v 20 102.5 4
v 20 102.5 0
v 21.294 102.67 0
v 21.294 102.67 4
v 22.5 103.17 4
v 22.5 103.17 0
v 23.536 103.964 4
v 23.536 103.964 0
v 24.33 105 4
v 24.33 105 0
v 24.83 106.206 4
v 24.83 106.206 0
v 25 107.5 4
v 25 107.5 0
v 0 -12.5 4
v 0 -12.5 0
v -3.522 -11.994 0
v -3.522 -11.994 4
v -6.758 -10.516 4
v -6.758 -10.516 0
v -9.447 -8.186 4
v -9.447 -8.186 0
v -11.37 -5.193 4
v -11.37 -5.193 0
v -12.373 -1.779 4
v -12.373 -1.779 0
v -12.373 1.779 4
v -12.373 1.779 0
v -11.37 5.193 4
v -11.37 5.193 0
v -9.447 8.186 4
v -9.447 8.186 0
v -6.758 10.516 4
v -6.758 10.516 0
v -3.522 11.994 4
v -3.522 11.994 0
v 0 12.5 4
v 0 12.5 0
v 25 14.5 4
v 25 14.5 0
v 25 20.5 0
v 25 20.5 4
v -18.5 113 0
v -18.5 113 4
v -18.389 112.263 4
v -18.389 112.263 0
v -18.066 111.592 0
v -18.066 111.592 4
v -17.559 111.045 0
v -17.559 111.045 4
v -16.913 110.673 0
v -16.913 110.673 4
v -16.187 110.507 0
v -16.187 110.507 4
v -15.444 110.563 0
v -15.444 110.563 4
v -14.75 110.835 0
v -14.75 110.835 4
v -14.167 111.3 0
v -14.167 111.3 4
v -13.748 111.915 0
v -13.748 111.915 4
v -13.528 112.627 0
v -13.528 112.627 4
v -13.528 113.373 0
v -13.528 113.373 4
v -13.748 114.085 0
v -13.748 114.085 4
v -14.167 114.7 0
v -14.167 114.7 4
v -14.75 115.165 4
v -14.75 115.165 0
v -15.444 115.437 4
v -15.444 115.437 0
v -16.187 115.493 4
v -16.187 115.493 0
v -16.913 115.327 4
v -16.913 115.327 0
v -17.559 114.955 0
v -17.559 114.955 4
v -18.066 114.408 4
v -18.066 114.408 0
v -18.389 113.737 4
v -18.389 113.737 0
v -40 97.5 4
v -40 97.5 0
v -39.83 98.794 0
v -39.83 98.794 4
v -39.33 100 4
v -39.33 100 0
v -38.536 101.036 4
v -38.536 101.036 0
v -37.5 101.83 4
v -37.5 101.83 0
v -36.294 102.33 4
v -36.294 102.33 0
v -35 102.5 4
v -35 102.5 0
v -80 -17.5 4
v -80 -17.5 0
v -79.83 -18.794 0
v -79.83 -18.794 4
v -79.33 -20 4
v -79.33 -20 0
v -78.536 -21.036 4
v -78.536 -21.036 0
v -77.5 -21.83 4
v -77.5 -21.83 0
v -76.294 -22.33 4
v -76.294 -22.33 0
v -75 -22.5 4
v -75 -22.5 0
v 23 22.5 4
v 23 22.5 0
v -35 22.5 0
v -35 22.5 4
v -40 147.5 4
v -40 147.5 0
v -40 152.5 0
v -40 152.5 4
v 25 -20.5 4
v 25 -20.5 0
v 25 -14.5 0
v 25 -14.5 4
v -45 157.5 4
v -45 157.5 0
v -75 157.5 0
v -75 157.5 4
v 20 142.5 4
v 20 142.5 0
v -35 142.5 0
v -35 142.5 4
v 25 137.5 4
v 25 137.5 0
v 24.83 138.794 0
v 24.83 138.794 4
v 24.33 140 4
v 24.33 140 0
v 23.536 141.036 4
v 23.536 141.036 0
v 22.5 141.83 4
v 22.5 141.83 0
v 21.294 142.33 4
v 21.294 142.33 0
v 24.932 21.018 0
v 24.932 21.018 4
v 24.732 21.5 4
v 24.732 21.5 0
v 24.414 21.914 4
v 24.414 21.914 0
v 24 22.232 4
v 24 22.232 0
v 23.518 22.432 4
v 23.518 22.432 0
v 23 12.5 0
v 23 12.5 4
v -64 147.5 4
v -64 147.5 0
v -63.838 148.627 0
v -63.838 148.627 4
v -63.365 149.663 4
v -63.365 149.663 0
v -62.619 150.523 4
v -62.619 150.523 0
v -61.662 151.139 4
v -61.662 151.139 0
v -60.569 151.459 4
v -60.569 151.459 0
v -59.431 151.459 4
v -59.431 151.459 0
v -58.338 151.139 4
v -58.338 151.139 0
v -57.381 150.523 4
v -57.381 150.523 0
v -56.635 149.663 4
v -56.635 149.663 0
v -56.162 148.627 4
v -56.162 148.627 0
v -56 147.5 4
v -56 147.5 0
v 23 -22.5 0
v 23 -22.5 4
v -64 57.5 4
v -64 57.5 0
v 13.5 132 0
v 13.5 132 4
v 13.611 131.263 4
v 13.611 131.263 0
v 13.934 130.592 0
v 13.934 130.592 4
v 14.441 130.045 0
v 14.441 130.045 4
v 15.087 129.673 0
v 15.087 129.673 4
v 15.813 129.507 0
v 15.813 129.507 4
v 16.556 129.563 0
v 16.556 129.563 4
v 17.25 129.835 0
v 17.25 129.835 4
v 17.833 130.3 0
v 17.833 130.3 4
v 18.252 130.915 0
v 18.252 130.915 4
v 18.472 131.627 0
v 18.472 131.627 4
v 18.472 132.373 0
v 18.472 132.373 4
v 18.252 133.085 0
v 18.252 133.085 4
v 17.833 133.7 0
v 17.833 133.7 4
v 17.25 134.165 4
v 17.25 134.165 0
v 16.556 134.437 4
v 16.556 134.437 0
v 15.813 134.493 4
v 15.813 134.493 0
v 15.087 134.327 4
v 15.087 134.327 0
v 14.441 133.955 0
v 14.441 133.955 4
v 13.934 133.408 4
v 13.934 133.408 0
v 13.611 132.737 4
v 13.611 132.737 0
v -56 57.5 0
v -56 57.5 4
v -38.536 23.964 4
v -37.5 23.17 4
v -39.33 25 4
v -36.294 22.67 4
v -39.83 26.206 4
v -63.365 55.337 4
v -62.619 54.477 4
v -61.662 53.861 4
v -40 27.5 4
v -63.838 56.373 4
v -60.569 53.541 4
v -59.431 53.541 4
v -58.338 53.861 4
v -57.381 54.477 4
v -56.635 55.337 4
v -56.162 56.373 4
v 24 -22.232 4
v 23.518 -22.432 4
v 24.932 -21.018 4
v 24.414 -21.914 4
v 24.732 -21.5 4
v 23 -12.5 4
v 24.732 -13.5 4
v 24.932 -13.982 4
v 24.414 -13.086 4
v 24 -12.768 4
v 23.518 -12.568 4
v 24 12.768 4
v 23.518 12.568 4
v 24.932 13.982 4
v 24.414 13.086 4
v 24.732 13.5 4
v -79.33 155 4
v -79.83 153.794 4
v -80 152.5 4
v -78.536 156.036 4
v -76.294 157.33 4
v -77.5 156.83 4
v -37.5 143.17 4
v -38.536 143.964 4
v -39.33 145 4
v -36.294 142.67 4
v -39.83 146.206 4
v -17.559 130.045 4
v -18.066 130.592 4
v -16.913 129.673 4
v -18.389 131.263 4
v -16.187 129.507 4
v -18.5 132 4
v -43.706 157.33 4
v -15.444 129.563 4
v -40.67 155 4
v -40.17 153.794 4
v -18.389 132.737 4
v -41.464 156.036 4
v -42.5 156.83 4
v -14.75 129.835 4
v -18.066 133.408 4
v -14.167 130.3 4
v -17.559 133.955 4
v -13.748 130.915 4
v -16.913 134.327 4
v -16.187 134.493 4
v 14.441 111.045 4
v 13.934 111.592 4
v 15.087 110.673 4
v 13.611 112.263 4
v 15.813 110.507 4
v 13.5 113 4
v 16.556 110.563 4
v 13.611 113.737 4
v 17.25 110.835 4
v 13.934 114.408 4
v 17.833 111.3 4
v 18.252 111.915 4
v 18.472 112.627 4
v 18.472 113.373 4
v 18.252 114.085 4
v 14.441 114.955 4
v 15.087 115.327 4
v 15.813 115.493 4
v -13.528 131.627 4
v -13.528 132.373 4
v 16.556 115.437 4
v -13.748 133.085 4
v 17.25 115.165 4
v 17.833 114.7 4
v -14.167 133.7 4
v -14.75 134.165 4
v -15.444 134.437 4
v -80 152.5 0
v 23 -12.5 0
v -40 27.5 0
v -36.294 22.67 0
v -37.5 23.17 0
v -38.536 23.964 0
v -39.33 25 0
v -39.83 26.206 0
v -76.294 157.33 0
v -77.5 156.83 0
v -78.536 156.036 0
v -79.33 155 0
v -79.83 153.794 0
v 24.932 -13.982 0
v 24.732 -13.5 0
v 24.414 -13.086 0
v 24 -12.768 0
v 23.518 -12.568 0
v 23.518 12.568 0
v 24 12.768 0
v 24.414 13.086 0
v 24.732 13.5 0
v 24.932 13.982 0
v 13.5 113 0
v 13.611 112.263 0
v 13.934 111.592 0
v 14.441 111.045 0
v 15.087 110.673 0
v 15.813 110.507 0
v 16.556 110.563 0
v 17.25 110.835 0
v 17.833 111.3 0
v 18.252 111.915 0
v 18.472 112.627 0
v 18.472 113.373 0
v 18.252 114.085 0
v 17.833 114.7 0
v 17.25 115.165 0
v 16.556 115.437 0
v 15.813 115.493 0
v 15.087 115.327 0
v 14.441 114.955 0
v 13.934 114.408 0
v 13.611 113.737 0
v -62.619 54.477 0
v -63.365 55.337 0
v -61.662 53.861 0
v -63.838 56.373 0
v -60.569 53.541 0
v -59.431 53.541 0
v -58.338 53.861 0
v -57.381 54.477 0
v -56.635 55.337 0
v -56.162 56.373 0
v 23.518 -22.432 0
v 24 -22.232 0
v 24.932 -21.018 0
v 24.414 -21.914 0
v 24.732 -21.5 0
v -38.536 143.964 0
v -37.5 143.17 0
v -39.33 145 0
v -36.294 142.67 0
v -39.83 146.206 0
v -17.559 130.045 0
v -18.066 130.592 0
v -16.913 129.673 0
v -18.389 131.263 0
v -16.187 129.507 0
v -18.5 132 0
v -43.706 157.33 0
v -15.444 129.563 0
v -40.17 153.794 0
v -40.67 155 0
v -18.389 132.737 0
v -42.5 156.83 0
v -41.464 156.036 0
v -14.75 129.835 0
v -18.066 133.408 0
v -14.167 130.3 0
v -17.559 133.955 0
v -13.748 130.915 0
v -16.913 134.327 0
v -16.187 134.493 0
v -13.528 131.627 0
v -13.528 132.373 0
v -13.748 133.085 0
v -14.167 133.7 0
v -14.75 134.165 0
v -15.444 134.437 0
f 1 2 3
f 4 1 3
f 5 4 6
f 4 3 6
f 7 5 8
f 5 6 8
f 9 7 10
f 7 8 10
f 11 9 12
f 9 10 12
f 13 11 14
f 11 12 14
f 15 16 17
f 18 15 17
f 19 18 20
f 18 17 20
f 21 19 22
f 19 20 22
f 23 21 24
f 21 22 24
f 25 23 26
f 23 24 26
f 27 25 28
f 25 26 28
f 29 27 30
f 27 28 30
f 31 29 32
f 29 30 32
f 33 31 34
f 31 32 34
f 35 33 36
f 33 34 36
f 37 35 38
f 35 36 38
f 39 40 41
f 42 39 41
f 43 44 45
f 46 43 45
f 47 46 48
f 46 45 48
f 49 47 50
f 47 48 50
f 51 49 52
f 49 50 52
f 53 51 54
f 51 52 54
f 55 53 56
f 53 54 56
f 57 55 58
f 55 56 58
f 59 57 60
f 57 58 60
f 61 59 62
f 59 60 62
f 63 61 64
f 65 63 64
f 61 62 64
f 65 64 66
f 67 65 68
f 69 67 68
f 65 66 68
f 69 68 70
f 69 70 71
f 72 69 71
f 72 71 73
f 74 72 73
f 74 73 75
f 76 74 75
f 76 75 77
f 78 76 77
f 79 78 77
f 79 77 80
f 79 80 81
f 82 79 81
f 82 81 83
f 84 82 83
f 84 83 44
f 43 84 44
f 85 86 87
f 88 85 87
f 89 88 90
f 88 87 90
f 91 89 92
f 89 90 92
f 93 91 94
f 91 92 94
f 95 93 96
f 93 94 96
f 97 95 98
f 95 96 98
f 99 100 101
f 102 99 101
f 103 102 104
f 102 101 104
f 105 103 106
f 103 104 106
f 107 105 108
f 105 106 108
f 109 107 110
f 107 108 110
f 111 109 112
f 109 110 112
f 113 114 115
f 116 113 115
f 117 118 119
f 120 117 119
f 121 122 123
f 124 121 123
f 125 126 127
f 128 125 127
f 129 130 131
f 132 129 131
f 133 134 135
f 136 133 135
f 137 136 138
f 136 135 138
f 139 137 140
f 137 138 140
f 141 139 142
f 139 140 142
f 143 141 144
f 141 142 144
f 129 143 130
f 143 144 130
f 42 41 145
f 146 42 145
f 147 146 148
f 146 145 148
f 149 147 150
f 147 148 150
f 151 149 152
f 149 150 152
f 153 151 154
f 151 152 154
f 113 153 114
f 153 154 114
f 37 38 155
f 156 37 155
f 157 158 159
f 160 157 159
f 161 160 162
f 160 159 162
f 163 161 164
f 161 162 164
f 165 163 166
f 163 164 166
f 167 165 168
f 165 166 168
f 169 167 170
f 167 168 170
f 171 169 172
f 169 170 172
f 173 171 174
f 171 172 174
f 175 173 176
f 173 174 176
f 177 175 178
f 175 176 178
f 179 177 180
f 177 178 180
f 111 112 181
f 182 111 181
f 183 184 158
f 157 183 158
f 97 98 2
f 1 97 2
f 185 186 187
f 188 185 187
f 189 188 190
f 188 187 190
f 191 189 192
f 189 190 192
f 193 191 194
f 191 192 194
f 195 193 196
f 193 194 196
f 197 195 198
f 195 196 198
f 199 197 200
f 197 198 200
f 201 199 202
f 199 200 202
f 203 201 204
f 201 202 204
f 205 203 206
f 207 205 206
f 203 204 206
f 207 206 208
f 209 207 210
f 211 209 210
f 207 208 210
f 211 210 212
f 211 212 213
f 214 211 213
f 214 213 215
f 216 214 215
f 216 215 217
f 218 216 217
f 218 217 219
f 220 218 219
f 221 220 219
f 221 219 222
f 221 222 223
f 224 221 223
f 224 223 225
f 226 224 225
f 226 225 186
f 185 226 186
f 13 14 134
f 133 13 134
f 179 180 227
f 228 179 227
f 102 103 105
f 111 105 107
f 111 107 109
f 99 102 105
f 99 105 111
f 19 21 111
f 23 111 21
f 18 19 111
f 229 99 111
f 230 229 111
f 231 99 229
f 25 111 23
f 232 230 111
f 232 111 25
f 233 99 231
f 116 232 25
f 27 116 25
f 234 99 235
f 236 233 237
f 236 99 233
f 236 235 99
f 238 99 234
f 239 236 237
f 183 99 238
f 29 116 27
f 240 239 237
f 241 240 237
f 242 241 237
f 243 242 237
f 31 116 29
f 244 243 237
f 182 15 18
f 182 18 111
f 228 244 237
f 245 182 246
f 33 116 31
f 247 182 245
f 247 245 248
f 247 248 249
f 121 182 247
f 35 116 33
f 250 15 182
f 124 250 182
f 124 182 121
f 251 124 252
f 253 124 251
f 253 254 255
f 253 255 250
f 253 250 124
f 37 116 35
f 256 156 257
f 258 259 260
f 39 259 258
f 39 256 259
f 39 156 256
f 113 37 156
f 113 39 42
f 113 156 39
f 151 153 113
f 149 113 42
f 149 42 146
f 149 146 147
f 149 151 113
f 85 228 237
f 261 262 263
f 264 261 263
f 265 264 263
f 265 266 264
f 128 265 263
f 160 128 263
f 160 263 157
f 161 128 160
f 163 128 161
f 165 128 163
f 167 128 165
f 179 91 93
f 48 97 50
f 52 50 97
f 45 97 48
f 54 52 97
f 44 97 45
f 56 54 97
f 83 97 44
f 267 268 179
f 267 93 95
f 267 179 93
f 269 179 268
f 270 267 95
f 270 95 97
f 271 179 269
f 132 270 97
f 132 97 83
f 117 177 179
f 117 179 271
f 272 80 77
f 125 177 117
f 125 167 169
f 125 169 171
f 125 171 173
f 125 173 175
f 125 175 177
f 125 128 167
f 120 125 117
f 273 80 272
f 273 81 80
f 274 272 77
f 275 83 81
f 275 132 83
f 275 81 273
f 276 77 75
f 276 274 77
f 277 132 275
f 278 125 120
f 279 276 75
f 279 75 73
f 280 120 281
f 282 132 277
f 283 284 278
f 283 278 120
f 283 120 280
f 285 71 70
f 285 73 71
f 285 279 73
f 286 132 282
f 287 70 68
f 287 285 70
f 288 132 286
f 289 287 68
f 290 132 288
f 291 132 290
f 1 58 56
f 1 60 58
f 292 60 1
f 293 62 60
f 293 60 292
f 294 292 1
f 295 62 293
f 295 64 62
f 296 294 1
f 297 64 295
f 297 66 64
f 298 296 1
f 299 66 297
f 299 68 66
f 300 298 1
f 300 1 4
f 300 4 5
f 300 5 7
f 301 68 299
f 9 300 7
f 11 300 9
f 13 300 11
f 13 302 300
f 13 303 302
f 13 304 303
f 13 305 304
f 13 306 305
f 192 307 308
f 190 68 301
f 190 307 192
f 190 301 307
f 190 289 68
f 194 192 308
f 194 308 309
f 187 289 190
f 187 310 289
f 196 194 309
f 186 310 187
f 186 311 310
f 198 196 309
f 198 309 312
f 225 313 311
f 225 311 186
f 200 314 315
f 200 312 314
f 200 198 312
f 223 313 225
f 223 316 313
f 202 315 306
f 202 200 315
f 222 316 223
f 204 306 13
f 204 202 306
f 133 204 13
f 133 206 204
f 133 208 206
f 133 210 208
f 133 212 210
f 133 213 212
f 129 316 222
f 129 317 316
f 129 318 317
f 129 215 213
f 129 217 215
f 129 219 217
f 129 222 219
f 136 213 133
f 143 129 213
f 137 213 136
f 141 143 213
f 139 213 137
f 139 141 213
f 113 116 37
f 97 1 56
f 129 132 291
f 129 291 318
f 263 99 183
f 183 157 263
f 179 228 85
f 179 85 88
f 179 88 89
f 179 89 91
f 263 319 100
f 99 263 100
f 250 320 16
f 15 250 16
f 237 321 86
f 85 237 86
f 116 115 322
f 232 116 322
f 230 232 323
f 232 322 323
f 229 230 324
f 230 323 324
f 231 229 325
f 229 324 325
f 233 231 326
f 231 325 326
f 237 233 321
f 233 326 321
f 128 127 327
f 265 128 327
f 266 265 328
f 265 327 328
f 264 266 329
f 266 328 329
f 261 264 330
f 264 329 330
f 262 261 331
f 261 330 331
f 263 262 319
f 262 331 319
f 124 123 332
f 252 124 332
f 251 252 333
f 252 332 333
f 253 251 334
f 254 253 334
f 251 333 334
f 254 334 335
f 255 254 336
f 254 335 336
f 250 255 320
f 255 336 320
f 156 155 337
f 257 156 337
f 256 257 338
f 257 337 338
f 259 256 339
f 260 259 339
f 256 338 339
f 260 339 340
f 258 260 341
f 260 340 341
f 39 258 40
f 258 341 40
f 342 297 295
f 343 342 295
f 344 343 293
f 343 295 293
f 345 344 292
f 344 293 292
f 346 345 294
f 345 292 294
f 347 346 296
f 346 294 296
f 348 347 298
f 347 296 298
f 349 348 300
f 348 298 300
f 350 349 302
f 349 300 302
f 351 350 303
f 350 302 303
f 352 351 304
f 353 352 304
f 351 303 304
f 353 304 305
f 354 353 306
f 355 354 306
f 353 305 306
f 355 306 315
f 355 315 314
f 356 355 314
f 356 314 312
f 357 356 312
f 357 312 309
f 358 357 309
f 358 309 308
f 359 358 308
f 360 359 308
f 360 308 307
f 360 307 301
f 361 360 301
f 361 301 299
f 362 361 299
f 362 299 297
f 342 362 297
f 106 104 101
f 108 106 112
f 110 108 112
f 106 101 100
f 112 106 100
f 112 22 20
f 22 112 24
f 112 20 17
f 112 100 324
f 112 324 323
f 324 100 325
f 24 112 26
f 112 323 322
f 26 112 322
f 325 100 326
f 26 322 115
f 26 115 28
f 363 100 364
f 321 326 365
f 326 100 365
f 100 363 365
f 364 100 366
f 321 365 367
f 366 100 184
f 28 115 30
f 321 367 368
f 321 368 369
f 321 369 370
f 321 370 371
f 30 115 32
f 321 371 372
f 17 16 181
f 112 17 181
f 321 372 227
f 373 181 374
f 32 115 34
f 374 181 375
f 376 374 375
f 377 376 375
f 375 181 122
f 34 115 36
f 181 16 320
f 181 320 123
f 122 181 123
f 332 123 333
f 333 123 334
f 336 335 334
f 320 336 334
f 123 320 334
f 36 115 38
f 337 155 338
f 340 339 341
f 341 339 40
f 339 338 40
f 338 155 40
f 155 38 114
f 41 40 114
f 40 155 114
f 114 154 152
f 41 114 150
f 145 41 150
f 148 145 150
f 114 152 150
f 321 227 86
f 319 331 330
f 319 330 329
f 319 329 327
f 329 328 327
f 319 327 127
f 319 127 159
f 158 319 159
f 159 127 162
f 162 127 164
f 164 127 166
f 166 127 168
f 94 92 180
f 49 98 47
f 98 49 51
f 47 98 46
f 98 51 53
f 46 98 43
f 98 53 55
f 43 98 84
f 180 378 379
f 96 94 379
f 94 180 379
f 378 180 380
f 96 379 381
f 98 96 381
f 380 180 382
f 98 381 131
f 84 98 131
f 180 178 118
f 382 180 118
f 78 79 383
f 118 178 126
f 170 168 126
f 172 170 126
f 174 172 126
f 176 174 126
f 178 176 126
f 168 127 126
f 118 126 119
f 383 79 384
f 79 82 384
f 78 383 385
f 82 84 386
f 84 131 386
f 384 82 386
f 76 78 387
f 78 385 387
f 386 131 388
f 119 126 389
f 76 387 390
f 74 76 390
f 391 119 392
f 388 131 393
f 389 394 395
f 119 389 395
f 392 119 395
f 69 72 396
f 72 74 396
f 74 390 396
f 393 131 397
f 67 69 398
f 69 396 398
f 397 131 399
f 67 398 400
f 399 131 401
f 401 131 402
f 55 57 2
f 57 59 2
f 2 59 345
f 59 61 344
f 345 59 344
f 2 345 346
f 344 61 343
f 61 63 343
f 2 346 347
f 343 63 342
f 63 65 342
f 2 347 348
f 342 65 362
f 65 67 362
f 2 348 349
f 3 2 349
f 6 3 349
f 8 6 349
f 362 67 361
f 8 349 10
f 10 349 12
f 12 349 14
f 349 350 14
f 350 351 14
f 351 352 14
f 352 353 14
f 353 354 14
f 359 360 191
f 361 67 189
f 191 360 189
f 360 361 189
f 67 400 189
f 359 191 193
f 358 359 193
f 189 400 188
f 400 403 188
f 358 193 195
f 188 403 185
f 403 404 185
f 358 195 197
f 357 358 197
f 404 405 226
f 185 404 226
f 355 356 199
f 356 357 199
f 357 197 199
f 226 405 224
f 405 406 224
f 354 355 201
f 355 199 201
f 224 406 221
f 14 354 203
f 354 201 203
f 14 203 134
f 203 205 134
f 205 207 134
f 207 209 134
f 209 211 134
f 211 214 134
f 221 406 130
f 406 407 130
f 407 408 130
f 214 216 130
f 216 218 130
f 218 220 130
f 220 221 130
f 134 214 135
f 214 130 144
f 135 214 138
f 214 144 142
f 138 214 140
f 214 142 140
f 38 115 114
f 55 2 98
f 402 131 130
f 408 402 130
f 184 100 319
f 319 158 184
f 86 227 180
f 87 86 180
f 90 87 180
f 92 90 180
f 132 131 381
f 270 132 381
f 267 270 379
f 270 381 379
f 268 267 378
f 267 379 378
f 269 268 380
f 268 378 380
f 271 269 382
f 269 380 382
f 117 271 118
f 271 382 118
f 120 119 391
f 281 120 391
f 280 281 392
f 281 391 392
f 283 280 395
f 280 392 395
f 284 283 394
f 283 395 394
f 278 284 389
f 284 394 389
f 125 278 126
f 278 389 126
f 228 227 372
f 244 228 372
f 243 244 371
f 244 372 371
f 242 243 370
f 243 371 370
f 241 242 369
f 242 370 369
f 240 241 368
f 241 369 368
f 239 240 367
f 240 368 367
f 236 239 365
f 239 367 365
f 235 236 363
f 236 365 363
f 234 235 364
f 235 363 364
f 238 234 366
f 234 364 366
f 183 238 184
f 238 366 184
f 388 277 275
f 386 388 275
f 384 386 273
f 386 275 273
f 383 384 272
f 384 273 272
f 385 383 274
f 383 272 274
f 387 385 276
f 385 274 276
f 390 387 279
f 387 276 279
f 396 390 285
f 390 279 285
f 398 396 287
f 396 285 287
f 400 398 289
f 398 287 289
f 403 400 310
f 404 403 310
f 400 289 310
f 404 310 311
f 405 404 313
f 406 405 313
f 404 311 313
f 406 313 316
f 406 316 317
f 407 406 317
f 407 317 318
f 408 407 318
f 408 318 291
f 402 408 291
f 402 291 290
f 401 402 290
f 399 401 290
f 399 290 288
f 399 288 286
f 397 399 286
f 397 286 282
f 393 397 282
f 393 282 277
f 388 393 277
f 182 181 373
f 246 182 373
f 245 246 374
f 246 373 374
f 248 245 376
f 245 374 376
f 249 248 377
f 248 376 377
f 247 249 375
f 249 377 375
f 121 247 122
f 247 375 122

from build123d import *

# Parameters (mm, degrees)
F1_DEPTH = 4
F2_D     = 5


with BuildPart() as f1:
    # F0 (on Top) → F1 (new body)
    with BuildSketch(Plane.XY):
        with BuildLine():
            ThreePointArc((0, -12.5), (-12.5, 0), (0, 12.5))
            Line((0, 12.5), (23, 12.5))
            ThreePointArc((23, 12.5), (24.4142135624, 13.0857864376), (25, 14.5))
            Line((25, 14.5), (25, 20.5))
            ThreePointArc((25, 20.5), (24.4142135624, 21.9142135624), (23, 22.5))
            Line((23, 22.5), (-35, 22.5))
            ThreePointArc((-35, 22.5), (-38.5355339059, 23.9644660941), (-40, 27.5))
            Line((-40, 27.5), (-40, 97.5))
            ThreePointArc((-40, 97.5), (-38.5355339059, 101.0355339059), (-35, 102.5))
            Line((-35, 102.5), (20, 102.5))
            ThreePointArc((20, 102.5), (23.5355339059, 103.9644660941), (25, 107.5))
            Line((25, 107.5), (25, 137.5))
            ThreePointArc((25, 137.5), (23.5355339059, 141.0355339059), (20, 142.5))
            Line((20, 142.5), (-35, 142.5))
            ThreePointArc((-35, 142.5), (-38.5355339059, 143.9644660941), (-40, 147.5))
            Line((-40, 147.5), (-40, 152.5))
            ThreePointArc((-40, 152.5), (-41.4644660941, 156.0355339059), (-45, 157.5))
            Line((-45, 157.5), (-75, 157.5))
            ThreePointArc((-75, 157.5), (-78.5355339059, 156.0355339059), (-80, 152.5))
            Line((-80, 152.5), (-80, -17.5))
            ThreePointArc((-80, -17.5), (-78.5355339059, -21.0355339059), (-75, -22.5))
            Line((-75, -22.5), (23, -22.5))
            ThreePointArc((23, -22.5), (24.4142135624, -21.9142135624), (25, -20.5))
            Line((25, -20.5), (25, -14.5))
            ThreePointArc((25, -14.5), (24.4142135624, -13.0857864376), (23, -12.5))
            Line((23, -12.5), (0, -12.5))
        make_face()
        with BuildLine():
            Line((-64, 57.5), (-64, 147.5))
            ThreePointArc((-64, 147.5), (-60, 151.5), (-56, 147.5))
            Line((-56, 147.5), (-56, 57.5))
            ThreePointArc((-56, 57.5), (-60, 53.5), (-64, 57.5))
        make_face(mode=Mode.SUBTRACT)
    extrude(amount=F1_DEPTH)

    # F2 (through all)
    with Locations(Plane(origin=(0, 0, 0), x_dir=(1, 0, 0), z_dir=(0, 0, -1))):
        with Locations((-16, -132), (16, -132), (16, -113), (-16, -113)):
            Hole(F2_D / 2)


solid = f1.part
